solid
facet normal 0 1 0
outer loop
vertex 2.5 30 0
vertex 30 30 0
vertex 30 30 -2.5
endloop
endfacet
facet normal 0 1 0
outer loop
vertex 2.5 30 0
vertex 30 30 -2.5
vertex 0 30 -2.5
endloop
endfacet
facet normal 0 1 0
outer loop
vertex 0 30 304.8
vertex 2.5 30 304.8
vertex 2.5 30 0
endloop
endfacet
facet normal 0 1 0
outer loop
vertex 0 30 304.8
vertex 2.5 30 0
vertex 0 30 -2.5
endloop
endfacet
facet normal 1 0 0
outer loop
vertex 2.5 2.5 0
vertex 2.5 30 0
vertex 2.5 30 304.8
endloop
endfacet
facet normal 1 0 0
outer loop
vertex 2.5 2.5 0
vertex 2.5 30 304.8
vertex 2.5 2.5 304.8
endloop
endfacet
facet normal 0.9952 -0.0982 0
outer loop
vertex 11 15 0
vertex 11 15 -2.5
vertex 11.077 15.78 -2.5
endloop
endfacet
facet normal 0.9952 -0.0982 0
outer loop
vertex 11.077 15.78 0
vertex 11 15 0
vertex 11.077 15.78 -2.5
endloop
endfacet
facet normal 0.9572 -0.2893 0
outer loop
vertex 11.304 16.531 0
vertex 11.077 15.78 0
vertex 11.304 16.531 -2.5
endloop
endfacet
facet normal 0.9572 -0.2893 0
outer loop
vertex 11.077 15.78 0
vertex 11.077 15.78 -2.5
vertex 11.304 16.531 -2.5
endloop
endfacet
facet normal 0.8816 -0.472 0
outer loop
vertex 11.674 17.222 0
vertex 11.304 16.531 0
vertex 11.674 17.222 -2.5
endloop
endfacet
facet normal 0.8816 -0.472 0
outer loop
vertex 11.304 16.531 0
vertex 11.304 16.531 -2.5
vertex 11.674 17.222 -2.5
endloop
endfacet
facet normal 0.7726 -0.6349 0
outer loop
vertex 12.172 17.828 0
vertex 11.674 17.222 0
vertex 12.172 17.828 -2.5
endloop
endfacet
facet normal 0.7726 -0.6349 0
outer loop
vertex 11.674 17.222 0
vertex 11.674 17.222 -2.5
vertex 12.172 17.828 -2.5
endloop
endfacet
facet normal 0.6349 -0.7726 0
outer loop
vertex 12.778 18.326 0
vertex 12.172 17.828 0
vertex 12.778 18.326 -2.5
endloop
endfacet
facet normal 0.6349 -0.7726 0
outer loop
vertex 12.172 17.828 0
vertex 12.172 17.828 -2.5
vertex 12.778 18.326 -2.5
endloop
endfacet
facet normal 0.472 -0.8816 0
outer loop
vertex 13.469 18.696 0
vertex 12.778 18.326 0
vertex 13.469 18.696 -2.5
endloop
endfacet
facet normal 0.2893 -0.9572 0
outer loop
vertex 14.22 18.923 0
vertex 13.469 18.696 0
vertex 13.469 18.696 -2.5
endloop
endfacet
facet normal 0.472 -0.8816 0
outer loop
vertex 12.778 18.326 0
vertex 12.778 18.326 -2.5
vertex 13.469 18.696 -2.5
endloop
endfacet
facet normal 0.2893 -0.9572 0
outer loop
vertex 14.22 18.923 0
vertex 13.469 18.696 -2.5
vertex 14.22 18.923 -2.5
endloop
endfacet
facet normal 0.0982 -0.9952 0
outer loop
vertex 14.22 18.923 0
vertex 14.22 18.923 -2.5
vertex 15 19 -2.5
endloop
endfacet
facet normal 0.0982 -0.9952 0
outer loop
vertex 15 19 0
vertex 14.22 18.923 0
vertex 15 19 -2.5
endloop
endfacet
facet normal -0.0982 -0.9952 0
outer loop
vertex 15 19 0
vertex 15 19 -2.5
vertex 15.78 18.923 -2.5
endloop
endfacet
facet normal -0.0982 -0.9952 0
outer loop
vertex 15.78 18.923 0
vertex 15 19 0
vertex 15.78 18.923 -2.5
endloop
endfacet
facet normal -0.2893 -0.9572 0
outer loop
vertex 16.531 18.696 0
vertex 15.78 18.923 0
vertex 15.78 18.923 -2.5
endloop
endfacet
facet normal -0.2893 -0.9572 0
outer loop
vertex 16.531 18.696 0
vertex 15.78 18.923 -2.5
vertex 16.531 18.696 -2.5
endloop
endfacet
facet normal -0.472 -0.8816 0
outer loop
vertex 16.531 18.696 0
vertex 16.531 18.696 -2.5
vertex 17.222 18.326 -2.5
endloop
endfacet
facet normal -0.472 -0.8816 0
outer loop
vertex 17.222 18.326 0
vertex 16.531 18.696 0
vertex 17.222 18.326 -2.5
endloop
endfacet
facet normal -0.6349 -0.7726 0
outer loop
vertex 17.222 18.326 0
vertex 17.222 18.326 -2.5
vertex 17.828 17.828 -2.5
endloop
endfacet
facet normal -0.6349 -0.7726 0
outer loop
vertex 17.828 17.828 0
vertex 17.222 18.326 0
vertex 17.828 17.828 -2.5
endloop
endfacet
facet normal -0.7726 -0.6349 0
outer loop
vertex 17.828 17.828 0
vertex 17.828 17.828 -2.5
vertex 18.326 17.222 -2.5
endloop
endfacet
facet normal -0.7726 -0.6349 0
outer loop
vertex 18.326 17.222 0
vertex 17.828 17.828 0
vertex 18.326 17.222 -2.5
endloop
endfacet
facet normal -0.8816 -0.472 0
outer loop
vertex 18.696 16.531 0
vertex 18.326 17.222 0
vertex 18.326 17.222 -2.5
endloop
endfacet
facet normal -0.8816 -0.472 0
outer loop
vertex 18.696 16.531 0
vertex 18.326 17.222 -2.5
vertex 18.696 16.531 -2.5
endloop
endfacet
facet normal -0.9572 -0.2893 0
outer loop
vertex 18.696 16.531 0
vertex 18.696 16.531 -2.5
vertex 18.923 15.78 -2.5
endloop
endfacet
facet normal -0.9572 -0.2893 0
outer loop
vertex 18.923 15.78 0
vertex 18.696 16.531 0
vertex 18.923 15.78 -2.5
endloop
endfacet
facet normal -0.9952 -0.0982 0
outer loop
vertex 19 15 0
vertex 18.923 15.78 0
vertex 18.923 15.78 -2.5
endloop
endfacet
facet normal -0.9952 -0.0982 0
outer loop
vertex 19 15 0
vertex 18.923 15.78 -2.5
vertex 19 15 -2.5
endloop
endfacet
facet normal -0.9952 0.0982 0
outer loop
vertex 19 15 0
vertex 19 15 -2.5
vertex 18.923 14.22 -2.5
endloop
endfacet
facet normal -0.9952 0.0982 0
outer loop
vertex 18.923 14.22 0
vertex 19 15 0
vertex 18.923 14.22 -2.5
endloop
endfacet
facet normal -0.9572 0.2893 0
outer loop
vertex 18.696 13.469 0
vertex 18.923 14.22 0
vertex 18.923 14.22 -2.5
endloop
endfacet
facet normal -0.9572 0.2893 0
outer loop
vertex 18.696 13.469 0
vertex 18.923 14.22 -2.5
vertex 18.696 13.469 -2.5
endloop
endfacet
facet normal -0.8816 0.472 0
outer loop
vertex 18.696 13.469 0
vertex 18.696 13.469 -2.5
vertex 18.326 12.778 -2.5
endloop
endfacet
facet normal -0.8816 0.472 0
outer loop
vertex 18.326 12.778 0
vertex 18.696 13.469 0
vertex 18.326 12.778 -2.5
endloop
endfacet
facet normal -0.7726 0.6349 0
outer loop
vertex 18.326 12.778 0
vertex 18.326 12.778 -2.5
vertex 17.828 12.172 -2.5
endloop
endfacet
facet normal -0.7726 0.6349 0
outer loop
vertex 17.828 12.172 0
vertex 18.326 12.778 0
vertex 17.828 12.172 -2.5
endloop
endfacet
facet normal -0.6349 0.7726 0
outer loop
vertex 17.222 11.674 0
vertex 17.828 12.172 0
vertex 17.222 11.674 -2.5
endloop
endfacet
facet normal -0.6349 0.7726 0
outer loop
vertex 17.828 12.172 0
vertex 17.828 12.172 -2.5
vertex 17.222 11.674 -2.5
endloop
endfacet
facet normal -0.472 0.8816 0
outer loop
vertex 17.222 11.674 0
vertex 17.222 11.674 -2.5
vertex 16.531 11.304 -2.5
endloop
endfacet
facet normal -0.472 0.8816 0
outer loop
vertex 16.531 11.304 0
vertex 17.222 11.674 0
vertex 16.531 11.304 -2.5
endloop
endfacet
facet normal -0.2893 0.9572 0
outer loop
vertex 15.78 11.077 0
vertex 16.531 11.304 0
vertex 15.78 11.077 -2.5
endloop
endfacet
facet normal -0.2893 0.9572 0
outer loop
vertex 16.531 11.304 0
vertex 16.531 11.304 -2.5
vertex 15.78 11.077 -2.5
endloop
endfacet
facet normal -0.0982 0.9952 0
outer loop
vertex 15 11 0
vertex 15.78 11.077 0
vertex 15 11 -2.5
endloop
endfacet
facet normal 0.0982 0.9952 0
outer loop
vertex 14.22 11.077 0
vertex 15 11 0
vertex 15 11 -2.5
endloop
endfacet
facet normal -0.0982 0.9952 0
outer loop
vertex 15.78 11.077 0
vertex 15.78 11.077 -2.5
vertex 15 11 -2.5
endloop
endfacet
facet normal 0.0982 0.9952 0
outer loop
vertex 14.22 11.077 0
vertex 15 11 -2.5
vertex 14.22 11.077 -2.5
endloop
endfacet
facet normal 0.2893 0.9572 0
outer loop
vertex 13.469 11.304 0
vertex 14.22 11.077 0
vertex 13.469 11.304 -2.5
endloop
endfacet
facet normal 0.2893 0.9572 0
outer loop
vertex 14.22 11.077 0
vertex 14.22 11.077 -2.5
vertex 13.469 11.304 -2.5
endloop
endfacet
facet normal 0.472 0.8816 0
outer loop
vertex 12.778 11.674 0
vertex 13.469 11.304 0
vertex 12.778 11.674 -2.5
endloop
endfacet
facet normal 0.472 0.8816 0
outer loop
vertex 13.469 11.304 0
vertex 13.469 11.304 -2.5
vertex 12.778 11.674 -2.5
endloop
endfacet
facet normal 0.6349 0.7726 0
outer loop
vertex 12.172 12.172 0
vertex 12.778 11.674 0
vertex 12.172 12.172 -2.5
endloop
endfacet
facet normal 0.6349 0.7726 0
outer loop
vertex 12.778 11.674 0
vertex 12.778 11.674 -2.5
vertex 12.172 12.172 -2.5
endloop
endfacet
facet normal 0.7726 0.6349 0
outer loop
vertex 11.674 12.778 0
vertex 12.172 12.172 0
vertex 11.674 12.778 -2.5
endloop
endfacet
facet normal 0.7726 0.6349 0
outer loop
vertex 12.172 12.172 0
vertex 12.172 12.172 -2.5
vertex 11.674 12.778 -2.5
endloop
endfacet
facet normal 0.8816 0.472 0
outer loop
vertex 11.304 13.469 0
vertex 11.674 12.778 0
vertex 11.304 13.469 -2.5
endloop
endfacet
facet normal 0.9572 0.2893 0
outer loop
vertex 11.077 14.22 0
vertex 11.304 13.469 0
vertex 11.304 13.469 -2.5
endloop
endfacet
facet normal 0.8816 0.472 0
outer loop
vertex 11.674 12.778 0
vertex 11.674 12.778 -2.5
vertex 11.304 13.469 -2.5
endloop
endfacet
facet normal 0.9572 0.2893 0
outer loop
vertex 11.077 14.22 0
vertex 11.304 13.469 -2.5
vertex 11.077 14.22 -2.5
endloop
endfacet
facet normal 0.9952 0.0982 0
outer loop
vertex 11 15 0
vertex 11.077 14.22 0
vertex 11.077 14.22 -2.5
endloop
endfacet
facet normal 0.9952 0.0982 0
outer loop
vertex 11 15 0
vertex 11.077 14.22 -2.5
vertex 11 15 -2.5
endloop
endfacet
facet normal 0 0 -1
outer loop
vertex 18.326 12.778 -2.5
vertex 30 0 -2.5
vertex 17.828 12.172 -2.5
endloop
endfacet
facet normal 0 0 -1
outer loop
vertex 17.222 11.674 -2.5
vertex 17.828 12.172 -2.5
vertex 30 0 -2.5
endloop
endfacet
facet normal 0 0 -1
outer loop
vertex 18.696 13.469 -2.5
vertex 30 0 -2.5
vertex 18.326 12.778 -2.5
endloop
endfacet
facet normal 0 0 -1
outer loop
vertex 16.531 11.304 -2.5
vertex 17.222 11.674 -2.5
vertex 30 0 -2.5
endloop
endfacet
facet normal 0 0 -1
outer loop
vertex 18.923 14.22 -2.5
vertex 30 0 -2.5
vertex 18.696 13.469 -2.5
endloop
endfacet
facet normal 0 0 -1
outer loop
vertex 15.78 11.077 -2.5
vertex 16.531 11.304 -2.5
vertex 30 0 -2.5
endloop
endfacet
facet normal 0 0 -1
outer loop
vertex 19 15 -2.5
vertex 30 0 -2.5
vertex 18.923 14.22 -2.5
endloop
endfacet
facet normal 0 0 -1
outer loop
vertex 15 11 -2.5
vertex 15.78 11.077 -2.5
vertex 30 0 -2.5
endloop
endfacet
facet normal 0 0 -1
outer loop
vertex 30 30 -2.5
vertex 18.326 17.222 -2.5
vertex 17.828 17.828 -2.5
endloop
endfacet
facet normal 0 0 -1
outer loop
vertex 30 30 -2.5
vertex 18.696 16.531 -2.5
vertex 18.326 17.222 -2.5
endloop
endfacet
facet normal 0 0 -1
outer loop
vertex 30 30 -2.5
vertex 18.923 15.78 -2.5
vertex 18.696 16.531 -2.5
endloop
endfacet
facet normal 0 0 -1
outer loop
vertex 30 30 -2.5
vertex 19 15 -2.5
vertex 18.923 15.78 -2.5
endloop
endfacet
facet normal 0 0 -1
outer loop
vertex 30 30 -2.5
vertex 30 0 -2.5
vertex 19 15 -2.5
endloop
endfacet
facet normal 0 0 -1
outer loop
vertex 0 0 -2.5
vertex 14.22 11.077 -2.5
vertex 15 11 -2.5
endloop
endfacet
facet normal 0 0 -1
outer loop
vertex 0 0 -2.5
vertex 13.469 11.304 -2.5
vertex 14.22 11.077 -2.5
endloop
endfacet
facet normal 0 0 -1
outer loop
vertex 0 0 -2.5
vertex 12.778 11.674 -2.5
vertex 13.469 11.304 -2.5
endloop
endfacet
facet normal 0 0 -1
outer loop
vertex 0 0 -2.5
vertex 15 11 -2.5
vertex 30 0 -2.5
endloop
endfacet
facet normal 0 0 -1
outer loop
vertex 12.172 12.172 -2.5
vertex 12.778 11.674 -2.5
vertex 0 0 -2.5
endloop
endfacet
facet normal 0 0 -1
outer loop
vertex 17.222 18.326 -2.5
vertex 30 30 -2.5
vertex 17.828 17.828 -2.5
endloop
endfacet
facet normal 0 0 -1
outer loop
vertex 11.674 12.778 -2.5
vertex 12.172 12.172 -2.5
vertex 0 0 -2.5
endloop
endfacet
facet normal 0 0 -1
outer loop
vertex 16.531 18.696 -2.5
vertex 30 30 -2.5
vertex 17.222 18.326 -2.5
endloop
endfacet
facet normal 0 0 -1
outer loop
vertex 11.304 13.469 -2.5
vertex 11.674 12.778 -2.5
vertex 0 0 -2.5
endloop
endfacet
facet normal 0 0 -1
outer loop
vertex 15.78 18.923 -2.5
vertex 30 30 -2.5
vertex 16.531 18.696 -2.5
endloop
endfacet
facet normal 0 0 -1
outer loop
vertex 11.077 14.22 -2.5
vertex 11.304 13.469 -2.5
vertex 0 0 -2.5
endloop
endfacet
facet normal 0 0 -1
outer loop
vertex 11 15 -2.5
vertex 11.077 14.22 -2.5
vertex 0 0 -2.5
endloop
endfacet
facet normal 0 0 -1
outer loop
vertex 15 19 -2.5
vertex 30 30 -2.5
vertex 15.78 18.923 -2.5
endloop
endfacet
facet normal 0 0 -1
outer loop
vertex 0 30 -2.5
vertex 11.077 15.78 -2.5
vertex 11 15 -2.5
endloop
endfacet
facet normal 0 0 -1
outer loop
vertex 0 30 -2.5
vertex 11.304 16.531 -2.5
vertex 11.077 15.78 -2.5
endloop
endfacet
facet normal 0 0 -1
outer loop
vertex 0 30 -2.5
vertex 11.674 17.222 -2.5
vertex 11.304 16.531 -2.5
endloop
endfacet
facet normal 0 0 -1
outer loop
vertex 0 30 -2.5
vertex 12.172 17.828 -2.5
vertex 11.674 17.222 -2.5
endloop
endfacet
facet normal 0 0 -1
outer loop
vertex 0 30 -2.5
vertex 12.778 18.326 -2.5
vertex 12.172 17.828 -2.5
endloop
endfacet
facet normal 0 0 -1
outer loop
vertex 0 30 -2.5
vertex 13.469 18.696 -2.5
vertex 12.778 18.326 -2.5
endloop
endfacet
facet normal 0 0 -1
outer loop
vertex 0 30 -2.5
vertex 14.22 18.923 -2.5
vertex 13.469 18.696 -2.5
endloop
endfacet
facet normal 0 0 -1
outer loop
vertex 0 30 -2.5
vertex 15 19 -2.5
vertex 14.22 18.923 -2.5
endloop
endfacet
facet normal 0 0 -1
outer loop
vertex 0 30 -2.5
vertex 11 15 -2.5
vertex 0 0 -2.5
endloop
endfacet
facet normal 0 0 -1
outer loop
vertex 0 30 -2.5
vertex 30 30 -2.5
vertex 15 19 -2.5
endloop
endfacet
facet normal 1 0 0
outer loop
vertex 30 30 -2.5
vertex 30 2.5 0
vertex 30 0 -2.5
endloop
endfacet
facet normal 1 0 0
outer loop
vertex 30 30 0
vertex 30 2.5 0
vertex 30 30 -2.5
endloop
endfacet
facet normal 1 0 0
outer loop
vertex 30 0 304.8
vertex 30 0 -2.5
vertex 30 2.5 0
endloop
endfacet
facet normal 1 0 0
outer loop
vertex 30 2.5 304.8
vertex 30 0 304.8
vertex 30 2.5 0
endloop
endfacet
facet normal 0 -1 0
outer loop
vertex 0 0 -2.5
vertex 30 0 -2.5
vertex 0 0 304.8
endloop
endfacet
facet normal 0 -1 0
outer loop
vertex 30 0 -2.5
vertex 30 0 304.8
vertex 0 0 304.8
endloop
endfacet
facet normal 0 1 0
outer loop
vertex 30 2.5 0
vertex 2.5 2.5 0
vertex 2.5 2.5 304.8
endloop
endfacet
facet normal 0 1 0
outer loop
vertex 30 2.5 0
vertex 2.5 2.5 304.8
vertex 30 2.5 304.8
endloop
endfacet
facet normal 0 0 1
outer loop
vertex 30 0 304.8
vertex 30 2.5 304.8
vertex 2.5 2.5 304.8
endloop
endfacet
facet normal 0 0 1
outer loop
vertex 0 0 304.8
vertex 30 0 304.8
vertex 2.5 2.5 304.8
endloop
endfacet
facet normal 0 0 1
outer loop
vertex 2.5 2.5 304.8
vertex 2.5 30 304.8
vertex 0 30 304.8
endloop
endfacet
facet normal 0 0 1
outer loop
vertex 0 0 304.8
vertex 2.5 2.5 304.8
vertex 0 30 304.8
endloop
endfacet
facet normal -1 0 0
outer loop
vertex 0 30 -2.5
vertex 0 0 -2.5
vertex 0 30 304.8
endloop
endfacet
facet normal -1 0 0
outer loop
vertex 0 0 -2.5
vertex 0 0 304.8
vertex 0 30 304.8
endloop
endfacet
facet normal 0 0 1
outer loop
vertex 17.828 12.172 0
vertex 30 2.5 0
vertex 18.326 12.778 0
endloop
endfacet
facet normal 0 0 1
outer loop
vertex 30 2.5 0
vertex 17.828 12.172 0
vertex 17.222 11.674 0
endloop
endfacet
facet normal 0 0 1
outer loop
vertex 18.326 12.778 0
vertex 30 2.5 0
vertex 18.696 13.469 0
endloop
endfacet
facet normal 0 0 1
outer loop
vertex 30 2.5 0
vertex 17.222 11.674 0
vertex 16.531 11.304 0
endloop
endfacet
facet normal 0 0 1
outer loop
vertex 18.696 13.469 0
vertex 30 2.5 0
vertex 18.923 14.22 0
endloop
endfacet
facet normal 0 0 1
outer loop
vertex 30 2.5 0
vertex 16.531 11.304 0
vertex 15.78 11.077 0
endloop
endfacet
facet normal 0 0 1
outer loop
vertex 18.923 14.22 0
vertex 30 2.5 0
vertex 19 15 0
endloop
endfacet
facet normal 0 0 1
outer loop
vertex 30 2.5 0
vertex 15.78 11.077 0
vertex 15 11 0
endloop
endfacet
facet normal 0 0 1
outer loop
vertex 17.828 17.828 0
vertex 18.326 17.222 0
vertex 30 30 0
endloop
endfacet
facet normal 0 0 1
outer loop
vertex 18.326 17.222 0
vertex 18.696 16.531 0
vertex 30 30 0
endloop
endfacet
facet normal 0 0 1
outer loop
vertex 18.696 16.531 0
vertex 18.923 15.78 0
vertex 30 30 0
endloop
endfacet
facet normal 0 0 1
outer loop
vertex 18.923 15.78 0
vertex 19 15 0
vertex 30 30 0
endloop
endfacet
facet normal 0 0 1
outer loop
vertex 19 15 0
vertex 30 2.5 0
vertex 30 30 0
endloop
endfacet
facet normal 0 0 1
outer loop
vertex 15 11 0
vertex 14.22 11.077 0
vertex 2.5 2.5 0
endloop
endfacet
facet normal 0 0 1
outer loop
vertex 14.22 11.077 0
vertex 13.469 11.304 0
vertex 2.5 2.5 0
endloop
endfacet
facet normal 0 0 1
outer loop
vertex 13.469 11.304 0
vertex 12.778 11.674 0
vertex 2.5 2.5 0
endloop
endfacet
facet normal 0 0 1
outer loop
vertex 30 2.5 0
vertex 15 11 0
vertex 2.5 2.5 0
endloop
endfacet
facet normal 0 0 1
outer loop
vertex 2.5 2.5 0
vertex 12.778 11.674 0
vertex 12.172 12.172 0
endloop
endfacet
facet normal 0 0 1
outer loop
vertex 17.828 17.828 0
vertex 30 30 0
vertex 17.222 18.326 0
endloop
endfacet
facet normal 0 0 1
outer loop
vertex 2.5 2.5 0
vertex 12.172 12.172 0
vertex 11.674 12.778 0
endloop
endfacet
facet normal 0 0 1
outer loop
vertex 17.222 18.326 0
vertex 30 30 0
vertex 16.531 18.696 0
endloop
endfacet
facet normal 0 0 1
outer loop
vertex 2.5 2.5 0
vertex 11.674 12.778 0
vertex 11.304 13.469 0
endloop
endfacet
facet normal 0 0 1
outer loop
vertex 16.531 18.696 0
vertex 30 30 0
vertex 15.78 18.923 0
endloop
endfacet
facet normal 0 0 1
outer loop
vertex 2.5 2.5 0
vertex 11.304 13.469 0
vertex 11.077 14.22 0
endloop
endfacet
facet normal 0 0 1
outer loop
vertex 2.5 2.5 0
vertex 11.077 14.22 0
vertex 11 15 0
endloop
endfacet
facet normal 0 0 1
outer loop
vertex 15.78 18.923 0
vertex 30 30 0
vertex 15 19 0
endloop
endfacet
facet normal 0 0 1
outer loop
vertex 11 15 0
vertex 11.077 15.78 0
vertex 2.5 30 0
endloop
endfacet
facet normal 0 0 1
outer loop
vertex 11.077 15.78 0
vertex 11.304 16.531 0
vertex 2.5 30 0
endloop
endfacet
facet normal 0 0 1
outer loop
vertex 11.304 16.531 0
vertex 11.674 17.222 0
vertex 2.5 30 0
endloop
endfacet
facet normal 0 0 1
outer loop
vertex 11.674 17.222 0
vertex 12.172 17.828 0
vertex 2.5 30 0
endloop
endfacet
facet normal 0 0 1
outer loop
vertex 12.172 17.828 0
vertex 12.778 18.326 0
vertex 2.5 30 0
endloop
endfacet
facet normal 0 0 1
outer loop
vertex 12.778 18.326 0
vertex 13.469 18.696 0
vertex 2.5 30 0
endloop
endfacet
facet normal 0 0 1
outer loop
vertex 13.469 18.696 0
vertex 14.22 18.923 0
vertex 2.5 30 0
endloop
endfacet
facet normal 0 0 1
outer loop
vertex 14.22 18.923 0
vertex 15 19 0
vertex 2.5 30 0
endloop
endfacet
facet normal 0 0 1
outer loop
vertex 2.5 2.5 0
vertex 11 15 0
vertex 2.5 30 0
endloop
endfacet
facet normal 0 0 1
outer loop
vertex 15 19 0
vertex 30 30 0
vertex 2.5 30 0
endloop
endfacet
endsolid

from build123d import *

# Parameters (mm, degrees)
BOSS_EXTRUDE1_DEPTH = 304.8
SKETCH2_W           = 30
SKETCH2_H           = 30
BOSS_EXTRUDE2_DEPTH = 2.5
SKETCH3_R           = 4
CUT_EXTRUDE1_DEPTH  = 311.214909377


with BuildPart() as part:
    # Sketch1 → Boss-Extrude1 (new body)
    with BuildSketch(Plane.XY):
        Polygon((0, 0), (0, 30), (2.5, 30), (2.5, 2.5), (30, 2.5), (30, 0), align=None)
    extrude(amount=BOSS_EXTRUDE1_DEPTH)

    # Sketch2 → Boss-Extrude2 (add)
    with BuildSketch(Plane(origin=(0, 0, 0), x_dir=(-1, 0, 0), z_dir=(0, 0, -1))):
        with Locations((-15, 15)):
            Rectangle(SKETCH2_W, SKETCH2_H)
    extrude(amount=BOSS_EXTRUDE2_DEPTH)

    # Sketch3 → Cut-Extrude1 (cut, through all)
    with BuildSketch(Plane(origin=(0, 0, -2.5), x_dir=(-1, 0, 0), z_dir=(0, 0, -1))):
        with Locations((-15, 15)):
            Circle(SKETCH3_R)
    extrude(amount=-CUT_EXTRUDE1_DEPTH, mode=Mode.SUBTRACT)


solid = part.part
